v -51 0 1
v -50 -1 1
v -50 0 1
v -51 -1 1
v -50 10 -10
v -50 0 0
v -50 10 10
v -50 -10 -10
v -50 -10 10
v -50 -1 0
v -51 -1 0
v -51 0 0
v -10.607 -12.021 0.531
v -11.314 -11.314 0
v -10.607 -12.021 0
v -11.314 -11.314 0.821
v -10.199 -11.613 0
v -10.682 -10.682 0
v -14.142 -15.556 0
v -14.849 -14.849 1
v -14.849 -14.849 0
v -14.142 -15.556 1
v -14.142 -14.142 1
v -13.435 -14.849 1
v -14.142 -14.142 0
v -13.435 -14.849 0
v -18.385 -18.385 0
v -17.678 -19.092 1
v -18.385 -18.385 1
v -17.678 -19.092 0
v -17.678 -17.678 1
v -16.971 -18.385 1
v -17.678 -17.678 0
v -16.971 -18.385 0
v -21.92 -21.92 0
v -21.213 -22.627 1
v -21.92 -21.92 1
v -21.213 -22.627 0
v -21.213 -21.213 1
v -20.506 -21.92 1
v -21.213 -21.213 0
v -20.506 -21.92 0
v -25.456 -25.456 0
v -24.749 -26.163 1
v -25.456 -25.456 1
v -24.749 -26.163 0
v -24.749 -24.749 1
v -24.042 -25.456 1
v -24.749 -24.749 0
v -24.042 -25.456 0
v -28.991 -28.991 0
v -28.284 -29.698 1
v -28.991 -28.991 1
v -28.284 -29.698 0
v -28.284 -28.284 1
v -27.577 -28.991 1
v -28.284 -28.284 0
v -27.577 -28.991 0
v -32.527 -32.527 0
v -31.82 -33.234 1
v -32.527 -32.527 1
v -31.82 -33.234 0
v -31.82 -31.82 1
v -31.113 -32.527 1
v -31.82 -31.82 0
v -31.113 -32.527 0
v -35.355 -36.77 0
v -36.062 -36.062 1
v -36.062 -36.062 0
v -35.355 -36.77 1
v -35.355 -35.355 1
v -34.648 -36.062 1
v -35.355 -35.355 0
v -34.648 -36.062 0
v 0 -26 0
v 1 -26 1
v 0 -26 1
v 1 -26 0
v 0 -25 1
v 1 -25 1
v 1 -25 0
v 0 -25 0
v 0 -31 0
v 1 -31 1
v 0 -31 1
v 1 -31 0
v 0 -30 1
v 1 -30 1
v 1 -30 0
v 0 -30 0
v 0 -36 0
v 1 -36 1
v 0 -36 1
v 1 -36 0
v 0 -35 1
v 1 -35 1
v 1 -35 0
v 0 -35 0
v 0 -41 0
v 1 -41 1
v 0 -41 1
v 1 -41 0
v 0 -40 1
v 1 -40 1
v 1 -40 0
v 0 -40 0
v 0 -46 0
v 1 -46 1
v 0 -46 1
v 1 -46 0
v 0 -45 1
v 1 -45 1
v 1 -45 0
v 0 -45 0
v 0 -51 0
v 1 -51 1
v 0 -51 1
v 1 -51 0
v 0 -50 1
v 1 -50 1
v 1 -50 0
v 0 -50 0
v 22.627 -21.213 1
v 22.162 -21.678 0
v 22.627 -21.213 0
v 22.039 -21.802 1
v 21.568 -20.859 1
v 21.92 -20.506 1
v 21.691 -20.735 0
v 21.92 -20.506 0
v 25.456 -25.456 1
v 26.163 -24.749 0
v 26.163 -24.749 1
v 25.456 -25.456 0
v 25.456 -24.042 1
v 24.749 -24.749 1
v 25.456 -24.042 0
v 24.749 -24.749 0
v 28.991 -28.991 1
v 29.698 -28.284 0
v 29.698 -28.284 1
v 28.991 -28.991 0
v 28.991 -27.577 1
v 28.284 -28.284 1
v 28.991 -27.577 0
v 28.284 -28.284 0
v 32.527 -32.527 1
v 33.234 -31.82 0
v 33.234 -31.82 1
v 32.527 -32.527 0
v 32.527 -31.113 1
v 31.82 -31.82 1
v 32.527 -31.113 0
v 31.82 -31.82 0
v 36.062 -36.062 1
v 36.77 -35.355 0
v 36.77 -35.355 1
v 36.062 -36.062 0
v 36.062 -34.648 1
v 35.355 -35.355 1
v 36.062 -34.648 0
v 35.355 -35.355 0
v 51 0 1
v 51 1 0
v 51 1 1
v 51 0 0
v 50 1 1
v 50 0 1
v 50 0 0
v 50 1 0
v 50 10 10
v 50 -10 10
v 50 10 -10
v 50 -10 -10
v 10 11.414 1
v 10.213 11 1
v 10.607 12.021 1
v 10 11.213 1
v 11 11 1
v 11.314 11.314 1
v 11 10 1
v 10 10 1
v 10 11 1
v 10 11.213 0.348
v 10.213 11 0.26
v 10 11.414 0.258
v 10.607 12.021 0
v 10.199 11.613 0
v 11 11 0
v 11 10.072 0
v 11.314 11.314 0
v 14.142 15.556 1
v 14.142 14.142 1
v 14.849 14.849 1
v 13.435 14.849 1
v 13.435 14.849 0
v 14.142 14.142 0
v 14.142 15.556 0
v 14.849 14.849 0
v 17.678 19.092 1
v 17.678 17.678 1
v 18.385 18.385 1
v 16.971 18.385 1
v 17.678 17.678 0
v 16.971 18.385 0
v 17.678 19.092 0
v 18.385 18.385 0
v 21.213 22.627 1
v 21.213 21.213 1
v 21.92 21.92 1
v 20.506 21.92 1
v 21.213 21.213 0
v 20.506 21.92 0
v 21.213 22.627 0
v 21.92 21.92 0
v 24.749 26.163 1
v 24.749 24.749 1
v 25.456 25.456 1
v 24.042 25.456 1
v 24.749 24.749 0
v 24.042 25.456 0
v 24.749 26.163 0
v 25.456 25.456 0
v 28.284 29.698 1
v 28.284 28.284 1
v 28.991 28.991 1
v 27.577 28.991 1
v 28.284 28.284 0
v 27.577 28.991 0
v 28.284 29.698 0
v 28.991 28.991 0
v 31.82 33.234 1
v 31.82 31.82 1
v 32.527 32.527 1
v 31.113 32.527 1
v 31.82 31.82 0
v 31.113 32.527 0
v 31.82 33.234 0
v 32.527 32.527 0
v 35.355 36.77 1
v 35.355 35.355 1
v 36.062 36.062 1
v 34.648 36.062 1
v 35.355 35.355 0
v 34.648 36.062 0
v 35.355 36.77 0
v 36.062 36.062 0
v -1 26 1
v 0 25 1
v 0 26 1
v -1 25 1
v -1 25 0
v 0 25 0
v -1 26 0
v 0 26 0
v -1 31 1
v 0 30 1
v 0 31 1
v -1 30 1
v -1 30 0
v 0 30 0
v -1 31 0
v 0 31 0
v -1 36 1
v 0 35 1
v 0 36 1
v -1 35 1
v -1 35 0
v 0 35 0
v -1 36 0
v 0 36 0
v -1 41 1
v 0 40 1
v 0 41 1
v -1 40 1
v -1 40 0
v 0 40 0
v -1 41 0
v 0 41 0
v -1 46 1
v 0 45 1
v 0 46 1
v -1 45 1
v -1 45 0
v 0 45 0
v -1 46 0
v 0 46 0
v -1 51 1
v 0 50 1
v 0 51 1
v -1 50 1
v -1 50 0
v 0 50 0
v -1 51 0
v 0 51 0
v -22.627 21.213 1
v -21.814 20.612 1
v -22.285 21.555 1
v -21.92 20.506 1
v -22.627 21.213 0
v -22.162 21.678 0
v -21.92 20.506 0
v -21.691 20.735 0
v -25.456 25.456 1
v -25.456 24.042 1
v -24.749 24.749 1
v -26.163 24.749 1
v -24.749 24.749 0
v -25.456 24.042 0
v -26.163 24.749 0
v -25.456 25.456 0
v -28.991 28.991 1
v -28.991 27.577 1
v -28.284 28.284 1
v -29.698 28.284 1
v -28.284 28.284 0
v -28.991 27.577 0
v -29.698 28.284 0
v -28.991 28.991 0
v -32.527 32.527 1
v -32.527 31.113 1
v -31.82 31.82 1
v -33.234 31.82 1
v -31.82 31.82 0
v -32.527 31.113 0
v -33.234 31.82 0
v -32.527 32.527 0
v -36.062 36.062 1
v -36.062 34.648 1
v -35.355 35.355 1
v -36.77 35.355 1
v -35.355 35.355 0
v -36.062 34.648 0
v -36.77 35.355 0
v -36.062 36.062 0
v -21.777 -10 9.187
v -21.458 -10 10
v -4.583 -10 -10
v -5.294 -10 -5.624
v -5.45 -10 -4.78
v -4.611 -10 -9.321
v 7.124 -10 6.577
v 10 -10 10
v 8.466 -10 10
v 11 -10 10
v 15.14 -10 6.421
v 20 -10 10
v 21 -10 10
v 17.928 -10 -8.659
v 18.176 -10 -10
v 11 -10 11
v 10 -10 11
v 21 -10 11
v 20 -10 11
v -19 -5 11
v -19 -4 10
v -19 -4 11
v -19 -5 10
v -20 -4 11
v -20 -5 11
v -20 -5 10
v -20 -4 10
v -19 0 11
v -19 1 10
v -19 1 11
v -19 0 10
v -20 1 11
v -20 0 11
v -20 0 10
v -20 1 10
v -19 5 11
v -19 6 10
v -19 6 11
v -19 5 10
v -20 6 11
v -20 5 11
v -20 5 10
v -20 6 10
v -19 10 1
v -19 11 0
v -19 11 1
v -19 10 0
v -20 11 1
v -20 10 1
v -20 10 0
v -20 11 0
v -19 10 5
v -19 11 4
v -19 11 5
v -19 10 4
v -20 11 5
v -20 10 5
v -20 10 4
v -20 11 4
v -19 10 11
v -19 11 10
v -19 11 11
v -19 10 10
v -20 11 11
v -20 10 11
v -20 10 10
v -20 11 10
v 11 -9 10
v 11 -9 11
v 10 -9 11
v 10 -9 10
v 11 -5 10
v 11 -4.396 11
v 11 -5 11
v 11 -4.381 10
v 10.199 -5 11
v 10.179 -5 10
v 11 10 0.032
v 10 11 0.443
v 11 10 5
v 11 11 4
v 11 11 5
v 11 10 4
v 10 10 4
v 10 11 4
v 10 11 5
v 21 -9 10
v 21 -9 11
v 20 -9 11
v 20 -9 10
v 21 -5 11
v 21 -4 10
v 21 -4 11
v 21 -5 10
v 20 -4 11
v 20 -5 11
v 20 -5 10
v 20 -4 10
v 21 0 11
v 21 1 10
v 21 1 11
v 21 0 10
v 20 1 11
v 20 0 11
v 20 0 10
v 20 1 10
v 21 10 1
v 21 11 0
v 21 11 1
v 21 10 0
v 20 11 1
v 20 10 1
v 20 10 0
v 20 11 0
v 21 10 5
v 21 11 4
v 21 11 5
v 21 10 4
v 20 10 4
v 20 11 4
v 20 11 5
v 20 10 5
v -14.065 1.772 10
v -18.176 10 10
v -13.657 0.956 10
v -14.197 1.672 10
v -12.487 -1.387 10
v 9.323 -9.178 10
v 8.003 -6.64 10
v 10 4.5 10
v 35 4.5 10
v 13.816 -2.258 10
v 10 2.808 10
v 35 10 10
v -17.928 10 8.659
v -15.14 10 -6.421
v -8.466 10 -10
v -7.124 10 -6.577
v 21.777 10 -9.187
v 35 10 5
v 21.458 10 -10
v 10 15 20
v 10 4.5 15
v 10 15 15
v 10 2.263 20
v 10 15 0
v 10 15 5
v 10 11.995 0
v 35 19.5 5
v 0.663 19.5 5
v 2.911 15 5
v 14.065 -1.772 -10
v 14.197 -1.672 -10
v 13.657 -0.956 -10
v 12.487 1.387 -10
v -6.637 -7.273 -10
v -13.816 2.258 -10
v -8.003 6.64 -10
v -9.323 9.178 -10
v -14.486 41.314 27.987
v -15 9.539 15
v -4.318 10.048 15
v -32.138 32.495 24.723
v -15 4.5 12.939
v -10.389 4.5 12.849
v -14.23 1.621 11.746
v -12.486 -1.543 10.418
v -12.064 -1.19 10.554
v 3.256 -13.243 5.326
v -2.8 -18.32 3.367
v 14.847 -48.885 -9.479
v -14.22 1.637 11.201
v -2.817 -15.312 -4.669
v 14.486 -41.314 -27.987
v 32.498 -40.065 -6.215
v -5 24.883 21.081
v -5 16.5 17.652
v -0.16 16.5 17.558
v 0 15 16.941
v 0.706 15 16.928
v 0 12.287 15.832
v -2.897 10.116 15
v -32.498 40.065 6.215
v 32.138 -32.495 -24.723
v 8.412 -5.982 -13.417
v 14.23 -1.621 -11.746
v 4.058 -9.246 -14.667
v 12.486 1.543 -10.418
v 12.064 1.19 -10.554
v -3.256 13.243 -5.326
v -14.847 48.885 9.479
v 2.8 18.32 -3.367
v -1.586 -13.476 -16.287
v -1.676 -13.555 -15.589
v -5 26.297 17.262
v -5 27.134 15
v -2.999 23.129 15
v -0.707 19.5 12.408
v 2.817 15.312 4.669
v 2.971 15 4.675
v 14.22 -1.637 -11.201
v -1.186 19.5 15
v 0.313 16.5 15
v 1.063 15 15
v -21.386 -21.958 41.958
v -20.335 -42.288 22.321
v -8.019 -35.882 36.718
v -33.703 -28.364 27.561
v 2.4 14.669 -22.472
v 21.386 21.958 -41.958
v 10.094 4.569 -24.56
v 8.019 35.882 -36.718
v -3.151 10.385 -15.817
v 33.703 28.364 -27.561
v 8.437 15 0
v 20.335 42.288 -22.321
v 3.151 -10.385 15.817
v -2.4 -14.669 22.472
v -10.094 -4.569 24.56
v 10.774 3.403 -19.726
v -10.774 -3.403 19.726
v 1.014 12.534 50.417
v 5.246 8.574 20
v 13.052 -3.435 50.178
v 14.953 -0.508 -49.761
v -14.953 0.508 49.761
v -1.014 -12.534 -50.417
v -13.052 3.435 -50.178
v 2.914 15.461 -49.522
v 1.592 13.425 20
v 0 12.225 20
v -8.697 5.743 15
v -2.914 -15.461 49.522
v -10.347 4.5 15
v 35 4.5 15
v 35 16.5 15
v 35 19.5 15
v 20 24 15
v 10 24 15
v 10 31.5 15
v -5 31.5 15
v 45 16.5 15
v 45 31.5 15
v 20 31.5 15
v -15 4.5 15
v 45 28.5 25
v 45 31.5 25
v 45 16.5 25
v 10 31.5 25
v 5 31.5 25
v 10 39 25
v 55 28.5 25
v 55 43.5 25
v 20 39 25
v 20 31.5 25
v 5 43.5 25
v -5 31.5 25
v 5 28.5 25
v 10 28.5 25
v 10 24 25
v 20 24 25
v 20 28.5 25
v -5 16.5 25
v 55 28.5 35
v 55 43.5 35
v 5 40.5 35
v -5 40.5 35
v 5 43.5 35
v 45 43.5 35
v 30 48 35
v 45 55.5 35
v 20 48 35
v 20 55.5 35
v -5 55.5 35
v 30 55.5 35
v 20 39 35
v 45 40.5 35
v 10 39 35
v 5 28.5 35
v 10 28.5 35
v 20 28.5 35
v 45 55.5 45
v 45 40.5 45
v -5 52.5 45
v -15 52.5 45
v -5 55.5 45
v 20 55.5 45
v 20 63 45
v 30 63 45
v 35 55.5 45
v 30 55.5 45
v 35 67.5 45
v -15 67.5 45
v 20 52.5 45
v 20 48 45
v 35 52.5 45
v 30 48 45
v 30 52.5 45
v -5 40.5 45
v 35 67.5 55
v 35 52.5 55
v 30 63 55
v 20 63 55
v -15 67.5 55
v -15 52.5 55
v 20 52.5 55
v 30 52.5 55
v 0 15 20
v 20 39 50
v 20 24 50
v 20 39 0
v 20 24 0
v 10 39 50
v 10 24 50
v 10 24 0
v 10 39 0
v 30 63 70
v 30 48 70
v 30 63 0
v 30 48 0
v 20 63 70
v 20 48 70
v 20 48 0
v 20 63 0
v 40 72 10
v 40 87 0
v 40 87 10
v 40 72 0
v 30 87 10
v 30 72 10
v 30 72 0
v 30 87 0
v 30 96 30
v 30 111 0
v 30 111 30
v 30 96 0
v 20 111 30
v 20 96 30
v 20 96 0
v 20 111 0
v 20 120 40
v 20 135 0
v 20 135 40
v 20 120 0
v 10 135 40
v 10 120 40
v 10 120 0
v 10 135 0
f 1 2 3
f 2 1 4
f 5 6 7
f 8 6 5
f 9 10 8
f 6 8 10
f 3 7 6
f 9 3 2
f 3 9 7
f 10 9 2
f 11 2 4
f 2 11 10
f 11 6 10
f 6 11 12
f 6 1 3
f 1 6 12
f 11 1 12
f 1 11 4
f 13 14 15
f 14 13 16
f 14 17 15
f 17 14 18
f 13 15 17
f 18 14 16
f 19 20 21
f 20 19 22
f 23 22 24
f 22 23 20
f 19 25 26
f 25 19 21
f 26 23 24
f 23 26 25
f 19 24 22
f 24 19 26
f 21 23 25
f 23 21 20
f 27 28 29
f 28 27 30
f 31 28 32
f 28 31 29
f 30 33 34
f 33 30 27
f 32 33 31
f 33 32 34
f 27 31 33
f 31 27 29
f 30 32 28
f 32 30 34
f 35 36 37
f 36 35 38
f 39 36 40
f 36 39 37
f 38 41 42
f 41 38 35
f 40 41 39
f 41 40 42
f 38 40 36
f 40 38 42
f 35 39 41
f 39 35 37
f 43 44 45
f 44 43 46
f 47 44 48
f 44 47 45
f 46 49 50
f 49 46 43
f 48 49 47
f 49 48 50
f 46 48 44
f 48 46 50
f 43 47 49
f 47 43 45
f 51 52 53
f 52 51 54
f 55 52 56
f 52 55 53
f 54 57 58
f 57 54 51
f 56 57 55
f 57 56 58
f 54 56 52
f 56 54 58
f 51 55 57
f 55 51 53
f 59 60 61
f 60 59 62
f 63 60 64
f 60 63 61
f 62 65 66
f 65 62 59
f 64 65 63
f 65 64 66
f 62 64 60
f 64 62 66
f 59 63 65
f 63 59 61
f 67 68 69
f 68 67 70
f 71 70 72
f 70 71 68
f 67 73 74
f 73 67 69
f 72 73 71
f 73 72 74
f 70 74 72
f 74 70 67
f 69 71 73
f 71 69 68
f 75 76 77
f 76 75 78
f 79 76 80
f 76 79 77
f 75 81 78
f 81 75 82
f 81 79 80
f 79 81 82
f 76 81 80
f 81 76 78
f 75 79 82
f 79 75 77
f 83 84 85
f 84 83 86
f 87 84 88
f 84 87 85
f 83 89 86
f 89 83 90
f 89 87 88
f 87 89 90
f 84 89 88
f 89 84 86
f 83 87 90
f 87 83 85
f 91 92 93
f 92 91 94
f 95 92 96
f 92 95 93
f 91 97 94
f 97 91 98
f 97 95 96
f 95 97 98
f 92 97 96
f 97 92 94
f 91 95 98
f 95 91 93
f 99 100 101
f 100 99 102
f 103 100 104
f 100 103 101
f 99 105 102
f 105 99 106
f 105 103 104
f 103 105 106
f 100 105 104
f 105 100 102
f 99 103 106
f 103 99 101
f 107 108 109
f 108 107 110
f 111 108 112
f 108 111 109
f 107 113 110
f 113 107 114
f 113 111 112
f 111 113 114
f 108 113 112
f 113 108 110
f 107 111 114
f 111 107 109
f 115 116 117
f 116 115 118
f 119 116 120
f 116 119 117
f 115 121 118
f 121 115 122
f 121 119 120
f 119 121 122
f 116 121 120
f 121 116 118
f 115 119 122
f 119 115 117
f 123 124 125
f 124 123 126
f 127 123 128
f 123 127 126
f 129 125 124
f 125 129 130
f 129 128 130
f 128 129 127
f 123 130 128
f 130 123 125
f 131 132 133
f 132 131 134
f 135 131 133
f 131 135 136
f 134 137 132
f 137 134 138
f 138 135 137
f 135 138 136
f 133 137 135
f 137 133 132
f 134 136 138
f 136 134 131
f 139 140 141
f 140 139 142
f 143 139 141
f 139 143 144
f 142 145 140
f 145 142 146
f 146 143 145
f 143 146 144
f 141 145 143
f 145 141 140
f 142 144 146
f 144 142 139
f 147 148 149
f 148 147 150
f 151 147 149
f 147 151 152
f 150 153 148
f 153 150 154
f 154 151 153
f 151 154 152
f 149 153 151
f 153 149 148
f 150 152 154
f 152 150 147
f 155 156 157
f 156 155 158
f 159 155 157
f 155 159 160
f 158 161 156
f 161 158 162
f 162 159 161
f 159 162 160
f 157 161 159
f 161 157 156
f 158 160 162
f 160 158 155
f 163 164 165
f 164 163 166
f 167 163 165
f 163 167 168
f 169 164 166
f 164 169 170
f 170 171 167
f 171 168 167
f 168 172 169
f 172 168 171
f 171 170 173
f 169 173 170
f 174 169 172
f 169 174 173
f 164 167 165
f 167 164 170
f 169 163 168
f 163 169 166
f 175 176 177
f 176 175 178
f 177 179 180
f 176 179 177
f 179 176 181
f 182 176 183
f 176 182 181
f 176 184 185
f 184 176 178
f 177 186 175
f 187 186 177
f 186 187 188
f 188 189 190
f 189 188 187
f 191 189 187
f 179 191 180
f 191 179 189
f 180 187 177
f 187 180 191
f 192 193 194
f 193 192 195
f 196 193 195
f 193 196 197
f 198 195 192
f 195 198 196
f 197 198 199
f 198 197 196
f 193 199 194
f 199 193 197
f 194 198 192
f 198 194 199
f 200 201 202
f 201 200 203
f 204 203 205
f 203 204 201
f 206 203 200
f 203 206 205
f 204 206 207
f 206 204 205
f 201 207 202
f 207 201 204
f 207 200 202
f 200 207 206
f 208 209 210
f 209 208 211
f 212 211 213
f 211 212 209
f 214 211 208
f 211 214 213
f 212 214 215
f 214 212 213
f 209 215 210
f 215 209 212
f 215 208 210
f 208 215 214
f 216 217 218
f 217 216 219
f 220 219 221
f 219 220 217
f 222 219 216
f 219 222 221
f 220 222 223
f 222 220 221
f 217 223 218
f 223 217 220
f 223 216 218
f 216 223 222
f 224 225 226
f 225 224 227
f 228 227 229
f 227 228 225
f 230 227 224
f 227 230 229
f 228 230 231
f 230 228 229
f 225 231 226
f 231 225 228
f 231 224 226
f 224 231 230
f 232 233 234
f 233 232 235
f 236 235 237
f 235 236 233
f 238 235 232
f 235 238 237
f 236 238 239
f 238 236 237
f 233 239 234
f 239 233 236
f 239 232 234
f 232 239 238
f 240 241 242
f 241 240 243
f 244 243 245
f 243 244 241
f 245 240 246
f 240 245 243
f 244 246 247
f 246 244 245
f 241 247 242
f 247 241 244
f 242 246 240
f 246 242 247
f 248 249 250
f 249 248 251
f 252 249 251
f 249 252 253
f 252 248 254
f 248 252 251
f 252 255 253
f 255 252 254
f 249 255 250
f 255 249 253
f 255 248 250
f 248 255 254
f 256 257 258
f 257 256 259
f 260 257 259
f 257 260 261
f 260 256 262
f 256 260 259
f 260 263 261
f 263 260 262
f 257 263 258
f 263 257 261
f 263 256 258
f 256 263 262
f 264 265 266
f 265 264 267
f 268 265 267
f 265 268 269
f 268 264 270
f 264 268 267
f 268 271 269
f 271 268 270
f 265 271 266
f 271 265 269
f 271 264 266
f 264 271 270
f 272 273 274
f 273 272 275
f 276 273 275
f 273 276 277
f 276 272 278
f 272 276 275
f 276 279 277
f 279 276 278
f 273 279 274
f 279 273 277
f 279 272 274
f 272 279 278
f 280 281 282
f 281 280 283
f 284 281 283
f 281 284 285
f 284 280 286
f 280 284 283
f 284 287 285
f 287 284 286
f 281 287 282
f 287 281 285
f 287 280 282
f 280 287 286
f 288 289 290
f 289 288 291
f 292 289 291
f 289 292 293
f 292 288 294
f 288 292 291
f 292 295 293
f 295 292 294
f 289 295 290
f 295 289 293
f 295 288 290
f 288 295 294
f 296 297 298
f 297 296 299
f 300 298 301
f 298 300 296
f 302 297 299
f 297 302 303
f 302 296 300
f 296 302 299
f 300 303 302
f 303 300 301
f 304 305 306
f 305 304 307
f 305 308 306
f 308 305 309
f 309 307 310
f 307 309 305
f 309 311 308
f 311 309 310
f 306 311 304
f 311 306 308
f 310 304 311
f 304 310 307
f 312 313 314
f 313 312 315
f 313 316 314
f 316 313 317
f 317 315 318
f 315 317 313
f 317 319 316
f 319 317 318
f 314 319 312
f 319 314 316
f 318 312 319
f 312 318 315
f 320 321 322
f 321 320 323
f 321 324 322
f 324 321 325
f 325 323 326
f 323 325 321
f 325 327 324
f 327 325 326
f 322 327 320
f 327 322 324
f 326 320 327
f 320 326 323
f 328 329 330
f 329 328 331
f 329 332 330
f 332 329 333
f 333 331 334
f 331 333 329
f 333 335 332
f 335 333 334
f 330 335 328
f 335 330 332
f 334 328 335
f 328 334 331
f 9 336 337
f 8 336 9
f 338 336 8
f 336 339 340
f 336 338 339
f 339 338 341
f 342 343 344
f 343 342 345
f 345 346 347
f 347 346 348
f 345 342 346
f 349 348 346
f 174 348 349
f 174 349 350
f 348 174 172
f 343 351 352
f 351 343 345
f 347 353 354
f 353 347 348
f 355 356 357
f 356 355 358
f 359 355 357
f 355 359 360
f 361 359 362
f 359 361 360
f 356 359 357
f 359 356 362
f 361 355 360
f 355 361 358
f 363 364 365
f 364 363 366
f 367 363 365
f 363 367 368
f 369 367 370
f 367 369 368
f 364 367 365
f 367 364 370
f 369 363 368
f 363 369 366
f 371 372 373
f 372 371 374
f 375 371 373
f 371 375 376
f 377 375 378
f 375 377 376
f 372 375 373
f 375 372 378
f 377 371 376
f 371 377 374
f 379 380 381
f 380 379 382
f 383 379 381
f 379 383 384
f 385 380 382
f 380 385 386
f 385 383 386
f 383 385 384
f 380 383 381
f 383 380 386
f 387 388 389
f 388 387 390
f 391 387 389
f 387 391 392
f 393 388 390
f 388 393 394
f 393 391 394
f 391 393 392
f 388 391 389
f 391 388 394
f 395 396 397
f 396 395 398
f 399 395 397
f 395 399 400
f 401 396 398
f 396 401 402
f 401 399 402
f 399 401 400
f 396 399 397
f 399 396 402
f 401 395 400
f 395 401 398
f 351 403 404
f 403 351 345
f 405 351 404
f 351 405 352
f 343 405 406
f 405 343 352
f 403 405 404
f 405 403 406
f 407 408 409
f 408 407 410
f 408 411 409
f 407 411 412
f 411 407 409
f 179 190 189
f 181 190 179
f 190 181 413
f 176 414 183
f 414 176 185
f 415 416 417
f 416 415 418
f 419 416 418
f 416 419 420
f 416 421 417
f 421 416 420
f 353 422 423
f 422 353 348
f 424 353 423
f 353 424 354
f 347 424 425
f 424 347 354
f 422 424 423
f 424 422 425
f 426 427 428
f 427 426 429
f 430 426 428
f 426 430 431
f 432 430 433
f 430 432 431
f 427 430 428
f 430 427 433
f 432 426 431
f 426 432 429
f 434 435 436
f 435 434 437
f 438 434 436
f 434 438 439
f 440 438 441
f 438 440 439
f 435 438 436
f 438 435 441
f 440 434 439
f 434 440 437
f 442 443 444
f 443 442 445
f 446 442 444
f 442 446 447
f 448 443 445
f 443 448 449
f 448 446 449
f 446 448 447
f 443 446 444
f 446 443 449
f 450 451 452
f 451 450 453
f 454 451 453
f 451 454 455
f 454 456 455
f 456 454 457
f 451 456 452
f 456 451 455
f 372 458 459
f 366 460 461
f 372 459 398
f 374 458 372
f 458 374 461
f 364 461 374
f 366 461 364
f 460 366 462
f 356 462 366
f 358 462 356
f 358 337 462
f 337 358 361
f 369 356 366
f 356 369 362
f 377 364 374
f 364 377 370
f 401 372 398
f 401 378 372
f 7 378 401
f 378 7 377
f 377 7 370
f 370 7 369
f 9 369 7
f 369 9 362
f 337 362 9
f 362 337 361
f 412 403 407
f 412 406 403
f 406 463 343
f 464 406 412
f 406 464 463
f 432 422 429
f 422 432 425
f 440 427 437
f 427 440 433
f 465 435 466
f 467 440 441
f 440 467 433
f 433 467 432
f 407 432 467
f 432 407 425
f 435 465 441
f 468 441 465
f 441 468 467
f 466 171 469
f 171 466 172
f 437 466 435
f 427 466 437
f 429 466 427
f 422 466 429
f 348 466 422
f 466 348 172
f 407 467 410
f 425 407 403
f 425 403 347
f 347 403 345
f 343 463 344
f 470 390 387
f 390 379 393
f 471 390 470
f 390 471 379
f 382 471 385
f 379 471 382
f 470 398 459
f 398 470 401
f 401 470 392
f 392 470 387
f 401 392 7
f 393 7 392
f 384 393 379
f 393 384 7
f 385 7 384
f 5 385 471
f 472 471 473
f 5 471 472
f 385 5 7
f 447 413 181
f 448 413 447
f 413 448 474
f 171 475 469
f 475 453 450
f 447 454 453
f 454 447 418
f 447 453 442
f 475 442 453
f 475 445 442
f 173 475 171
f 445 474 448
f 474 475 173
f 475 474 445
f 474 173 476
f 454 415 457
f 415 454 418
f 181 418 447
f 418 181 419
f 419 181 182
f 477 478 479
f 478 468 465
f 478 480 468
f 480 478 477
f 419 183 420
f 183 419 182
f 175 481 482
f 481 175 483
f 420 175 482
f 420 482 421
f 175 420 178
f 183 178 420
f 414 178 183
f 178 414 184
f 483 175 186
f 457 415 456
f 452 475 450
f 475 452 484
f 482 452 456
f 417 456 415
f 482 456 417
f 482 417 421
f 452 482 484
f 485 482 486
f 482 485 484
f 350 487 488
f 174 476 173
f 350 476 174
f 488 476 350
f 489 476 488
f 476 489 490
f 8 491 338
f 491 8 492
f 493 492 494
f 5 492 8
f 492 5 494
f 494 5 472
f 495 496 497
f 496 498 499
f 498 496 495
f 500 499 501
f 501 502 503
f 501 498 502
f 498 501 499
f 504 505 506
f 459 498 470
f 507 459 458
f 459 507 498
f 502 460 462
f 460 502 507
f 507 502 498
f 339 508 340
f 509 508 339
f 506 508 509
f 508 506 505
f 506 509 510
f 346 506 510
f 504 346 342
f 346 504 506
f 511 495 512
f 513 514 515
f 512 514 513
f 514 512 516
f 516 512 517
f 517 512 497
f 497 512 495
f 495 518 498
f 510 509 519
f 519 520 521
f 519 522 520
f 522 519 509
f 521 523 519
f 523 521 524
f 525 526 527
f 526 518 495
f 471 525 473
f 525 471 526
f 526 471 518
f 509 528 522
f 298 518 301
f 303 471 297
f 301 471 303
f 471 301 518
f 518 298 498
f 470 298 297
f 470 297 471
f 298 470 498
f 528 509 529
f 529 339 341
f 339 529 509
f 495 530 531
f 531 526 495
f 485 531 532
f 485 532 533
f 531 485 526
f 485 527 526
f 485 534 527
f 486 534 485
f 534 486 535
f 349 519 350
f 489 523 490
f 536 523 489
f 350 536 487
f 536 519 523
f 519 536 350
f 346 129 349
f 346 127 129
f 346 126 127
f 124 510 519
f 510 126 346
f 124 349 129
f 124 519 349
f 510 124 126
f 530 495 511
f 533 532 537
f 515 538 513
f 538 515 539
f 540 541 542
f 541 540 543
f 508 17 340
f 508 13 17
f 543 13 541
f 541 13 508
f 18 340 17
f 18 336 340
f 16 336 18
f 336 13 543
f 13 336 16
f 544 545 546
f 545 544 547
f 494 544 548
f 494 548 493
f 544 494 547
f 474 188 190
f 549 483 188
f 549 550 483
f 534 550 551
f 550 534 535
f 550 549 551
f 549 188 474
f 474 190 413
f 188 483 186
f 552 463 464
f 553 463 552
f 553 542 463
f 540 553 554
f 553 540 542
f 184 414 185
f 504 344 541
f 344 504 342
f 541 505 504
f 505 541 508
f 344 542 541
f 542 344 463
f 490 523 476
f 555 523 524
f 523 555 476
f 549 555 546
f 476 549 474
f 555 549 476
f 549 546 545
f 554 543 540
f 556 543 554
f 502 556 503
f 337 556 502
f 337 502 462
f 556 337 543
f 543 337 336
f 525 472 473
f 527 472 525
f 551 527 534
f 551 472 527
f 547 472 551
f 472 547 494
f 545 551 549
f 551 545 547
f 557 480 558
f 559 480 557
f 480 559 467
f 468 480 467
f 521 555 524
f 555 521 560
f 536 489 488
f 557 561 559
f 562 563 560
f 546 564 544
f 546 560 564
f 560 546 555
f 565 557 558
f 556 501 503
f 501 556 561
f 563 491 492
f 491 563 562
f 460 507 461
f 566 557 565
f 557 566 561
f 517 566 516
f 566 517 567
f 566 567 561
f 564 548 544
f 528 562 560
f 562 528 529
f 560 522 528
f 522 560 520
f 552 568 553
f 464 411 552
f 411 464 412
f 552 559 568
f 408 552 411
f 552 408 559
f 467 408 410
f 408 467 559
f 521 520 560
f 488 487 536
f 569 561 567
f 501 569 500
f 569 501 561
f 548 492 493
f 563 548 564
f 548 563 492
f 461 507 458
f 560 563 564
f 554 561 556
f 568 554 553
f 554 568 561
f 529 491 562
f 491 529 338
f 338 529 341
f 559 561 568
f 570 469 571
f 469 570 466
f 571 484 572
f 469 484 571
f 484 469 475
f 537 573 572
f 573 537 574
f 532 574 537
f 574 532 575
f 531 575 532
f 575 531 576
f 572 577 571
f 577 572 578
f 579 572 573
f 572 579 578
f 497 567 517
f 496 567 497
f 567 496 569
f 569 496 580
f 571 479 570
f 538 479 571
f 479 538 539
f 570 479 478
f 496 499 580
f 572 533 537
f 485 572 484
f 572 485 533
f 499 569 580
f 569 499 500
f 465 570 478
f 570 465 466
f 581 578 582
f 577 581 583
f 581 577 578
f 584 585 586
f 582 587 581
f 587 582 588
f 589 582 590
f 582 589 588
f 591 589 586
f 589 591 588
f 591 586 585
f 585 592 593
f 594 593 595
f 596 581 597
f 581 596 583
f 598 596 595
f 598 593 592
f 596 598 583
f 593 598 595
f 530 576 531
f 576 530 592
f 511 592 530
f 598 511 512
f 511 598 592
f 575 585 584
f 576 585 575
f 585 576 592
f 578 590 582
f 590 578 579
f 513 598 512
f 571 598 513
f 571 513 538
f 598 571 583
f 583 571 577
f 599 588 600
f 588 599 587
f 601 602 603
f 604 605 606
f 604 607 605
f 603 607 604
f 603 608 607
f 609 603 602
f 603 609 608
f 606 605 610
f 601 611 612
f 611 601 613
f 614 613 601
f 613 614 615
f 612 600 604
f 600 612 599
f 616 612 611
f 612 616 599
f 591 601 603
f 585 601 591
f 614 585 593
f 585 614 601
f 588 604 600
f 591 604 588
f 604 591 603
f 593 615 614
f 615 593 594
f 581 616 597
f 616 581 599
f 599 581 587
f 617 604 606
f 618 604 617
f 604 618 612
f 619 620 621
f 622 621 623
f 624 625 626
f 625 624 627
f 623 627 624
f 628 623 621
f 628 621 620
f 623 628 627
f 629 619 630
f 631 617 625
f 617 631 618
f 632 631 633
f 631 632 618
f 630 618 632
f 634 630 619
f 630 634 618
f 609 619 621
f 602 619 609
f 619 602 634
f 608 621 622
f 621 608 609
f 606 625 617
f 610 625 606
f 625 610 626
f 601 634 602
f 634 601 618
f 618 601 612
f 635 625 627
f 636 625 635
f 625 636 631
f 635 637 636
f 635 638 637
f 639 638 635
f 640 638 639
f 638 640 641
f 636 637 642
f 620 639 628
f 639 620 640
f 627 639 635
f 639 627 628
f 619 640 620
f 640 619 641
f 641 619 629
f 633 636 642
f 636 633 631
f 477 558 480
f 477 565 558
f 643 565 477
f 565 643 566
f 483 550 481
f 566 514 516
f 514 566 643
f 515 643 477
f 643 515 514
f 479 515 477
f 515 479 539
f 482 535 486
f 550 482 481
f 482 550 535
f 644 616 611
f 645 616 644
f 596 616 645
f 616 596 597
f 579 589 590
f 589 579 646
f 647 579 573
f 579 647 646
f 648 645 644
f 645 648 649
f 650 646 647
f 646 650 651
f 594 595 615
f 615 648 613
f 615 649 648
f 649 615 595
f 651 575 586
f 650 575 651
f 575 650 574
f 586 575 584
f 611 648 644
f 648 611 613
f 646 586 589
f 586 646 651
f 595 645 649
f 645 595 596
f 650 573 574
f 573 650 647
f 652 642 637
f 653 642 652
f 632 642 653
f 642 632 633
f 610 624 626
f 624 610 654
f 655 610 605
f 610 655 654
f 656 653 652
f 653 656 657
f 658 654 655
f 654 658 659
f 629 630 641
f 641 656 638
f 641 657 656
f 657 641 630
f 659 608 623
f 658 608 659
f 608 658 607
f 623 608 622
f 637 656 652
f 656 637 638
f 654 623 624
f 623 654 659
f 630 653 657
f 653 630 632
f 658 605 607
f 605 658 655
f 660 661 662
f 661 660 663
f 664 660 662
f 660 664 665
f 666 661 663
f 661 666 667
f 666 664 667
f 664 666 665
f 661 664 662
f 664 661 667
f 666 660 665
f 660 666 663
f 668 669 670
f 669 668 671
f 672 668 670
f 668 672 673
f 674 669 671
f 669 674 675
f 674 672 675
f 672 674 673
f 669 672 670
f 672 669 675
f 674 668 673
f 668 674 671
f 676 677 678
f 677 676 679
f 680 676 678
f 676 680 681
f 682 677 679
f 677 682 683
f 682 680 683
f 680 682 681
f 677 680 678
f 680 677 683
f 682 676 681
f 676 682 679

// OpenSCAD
/*
 * statements: for statement
 *
 * Copyright © 2022 Giampiero Gabbiani (giampiero@gabbiani.org)
 *
 * This file is part of the 'AutoDox' (ADOX) project.
 *
 * ADOX is free software: you can redistribute it and/or modify
 * it under the terms of the GNU General Public License as published by
 * the Free Software Foundation, either version 3 of the License, or
 * (at your option) any later version.
 *
 * ADOX is distributed in the hope that it will be useful,
 * but WITHOUT ANY WARRANTY; without even the implied warranty of
 * MERCHANTABILITY or FITNESS FOR A PARTICULAR PURPOSE.  See the
 * GNU General Public License for more details.
 *
 * You should have received a copy of the GNU General Public License
 * along with ADOX.  If not, see <http: //www.gnu.org/licenses/>.
 */

for (a =[3:5])echo(a);     // 3 4 5
for (a =[3:0]){echo(a);}   // 0 1 2 3         start > end is invalid, deprecated by 2015.3
for (a =[3:0.5:5])echo(a); // 3 3.5 4 4.5 5
for (a =[0:2:5])echo(a);   // 0 2 4           a never equals end
for (a =[3:-2:-1])echo(a); // 3 1 -1          negative increment requires 2015.3 be sure end < start

for (a =[3,4,1,5])echo(a); // 3 4 1 5
for (a =[0.3,PI,1,99]){echo(a);}    // 0.3 3.14159 1 99
x1=2; x2=8; x3=5.5;
for (a =[x1,x2,x3]){echo(a);} // 2 8 5.5
for (a =[[1,2],6,"s",[[3,4],[5,6]]])echo(a);  // [1,2] 6 "s" [[3,4],[5,6]]

animals = ["elephants", "snakes", "tigers", "giraffes"];
for(animal = animals)
    echo(str("I've been to the zoo and saw ", animal));
 // "I've been to the zoo and saw elephants", for each animal

for (i=[0:3])
    translate([i*10,0,0])
        cube(i+1);

// nested for
for(z=[-180:45:+180])
    for(x=[10:5:50])
        rotate([0,0,z]) translate([x,0,0]) cube(1);

// example for() nested 3 deep

color_vec = ["black","red","blue","green","pink","purple"];
for (x = [-20:10:20] )
    for (y = [0:4] )
        color(color_vec[y])
            for (z = [0,4,10] ) {
                translate([x,y*5-10,z])
                    cube();
            }

// shorthand nesting for same result

color_vec = ["black","red","blue","green","pink","purple"];
for (x = [-20:10:20],
    y = [0:4],
    z = [0,4,10] )
        translate([x,y*5-10,z]){color(color_vec[y])cube();}

// example 1 - iteration over a vector of vectors (rotation)
for(i = [ [  0,  0,   0],
    [ 10, 20, 300],
    [200, 40,  57],
    [ 20, 88,  57] ])
{
    rotate(i)
    cube([100, 20, 20], center = true);
}


// example 2 for() loop vector of vectors (translation)
for(i = [ [ 0,  0,  0],
        [10, 12, 10],
        [20, 24, 20],
        [30, 36, 30],
        [20, 48, 40],
        [10, 60, 50] ])
{
    translate(i)
    cube([50, 15, 10], center = true);
}

// example 3 for() loop vector of vectors
for(i = [ [[ 0,  0,  0], 20],
          [[10, 12, 10], 50],
          [[20, 24, 20], 70],
          [[30, 36, 30], 10],
          [[20, 48, 40], 30],
          [[10, 60, 50], 40] ])
{
  translate([i[0][0], 2*i[0][1], 0])
  cube([10, 15, i[1]]);
}

// example 1 - loop over a range:
intersection_for(n = [1 : 6])
{
    rotate([0, 0, n * 60])
    {
        translate([5,0,0])
        sphere(r=12);
    }
}

// example 2 - rotation :
 intersection_for(i = [ [  0,  0,   0],
 			[ 10, 20, 300],
 			[200, 40,  57],
 			[ 20, 88,  57] ])
{
    rotate(i)
    cube([100, 20, 20], center = true);
}
